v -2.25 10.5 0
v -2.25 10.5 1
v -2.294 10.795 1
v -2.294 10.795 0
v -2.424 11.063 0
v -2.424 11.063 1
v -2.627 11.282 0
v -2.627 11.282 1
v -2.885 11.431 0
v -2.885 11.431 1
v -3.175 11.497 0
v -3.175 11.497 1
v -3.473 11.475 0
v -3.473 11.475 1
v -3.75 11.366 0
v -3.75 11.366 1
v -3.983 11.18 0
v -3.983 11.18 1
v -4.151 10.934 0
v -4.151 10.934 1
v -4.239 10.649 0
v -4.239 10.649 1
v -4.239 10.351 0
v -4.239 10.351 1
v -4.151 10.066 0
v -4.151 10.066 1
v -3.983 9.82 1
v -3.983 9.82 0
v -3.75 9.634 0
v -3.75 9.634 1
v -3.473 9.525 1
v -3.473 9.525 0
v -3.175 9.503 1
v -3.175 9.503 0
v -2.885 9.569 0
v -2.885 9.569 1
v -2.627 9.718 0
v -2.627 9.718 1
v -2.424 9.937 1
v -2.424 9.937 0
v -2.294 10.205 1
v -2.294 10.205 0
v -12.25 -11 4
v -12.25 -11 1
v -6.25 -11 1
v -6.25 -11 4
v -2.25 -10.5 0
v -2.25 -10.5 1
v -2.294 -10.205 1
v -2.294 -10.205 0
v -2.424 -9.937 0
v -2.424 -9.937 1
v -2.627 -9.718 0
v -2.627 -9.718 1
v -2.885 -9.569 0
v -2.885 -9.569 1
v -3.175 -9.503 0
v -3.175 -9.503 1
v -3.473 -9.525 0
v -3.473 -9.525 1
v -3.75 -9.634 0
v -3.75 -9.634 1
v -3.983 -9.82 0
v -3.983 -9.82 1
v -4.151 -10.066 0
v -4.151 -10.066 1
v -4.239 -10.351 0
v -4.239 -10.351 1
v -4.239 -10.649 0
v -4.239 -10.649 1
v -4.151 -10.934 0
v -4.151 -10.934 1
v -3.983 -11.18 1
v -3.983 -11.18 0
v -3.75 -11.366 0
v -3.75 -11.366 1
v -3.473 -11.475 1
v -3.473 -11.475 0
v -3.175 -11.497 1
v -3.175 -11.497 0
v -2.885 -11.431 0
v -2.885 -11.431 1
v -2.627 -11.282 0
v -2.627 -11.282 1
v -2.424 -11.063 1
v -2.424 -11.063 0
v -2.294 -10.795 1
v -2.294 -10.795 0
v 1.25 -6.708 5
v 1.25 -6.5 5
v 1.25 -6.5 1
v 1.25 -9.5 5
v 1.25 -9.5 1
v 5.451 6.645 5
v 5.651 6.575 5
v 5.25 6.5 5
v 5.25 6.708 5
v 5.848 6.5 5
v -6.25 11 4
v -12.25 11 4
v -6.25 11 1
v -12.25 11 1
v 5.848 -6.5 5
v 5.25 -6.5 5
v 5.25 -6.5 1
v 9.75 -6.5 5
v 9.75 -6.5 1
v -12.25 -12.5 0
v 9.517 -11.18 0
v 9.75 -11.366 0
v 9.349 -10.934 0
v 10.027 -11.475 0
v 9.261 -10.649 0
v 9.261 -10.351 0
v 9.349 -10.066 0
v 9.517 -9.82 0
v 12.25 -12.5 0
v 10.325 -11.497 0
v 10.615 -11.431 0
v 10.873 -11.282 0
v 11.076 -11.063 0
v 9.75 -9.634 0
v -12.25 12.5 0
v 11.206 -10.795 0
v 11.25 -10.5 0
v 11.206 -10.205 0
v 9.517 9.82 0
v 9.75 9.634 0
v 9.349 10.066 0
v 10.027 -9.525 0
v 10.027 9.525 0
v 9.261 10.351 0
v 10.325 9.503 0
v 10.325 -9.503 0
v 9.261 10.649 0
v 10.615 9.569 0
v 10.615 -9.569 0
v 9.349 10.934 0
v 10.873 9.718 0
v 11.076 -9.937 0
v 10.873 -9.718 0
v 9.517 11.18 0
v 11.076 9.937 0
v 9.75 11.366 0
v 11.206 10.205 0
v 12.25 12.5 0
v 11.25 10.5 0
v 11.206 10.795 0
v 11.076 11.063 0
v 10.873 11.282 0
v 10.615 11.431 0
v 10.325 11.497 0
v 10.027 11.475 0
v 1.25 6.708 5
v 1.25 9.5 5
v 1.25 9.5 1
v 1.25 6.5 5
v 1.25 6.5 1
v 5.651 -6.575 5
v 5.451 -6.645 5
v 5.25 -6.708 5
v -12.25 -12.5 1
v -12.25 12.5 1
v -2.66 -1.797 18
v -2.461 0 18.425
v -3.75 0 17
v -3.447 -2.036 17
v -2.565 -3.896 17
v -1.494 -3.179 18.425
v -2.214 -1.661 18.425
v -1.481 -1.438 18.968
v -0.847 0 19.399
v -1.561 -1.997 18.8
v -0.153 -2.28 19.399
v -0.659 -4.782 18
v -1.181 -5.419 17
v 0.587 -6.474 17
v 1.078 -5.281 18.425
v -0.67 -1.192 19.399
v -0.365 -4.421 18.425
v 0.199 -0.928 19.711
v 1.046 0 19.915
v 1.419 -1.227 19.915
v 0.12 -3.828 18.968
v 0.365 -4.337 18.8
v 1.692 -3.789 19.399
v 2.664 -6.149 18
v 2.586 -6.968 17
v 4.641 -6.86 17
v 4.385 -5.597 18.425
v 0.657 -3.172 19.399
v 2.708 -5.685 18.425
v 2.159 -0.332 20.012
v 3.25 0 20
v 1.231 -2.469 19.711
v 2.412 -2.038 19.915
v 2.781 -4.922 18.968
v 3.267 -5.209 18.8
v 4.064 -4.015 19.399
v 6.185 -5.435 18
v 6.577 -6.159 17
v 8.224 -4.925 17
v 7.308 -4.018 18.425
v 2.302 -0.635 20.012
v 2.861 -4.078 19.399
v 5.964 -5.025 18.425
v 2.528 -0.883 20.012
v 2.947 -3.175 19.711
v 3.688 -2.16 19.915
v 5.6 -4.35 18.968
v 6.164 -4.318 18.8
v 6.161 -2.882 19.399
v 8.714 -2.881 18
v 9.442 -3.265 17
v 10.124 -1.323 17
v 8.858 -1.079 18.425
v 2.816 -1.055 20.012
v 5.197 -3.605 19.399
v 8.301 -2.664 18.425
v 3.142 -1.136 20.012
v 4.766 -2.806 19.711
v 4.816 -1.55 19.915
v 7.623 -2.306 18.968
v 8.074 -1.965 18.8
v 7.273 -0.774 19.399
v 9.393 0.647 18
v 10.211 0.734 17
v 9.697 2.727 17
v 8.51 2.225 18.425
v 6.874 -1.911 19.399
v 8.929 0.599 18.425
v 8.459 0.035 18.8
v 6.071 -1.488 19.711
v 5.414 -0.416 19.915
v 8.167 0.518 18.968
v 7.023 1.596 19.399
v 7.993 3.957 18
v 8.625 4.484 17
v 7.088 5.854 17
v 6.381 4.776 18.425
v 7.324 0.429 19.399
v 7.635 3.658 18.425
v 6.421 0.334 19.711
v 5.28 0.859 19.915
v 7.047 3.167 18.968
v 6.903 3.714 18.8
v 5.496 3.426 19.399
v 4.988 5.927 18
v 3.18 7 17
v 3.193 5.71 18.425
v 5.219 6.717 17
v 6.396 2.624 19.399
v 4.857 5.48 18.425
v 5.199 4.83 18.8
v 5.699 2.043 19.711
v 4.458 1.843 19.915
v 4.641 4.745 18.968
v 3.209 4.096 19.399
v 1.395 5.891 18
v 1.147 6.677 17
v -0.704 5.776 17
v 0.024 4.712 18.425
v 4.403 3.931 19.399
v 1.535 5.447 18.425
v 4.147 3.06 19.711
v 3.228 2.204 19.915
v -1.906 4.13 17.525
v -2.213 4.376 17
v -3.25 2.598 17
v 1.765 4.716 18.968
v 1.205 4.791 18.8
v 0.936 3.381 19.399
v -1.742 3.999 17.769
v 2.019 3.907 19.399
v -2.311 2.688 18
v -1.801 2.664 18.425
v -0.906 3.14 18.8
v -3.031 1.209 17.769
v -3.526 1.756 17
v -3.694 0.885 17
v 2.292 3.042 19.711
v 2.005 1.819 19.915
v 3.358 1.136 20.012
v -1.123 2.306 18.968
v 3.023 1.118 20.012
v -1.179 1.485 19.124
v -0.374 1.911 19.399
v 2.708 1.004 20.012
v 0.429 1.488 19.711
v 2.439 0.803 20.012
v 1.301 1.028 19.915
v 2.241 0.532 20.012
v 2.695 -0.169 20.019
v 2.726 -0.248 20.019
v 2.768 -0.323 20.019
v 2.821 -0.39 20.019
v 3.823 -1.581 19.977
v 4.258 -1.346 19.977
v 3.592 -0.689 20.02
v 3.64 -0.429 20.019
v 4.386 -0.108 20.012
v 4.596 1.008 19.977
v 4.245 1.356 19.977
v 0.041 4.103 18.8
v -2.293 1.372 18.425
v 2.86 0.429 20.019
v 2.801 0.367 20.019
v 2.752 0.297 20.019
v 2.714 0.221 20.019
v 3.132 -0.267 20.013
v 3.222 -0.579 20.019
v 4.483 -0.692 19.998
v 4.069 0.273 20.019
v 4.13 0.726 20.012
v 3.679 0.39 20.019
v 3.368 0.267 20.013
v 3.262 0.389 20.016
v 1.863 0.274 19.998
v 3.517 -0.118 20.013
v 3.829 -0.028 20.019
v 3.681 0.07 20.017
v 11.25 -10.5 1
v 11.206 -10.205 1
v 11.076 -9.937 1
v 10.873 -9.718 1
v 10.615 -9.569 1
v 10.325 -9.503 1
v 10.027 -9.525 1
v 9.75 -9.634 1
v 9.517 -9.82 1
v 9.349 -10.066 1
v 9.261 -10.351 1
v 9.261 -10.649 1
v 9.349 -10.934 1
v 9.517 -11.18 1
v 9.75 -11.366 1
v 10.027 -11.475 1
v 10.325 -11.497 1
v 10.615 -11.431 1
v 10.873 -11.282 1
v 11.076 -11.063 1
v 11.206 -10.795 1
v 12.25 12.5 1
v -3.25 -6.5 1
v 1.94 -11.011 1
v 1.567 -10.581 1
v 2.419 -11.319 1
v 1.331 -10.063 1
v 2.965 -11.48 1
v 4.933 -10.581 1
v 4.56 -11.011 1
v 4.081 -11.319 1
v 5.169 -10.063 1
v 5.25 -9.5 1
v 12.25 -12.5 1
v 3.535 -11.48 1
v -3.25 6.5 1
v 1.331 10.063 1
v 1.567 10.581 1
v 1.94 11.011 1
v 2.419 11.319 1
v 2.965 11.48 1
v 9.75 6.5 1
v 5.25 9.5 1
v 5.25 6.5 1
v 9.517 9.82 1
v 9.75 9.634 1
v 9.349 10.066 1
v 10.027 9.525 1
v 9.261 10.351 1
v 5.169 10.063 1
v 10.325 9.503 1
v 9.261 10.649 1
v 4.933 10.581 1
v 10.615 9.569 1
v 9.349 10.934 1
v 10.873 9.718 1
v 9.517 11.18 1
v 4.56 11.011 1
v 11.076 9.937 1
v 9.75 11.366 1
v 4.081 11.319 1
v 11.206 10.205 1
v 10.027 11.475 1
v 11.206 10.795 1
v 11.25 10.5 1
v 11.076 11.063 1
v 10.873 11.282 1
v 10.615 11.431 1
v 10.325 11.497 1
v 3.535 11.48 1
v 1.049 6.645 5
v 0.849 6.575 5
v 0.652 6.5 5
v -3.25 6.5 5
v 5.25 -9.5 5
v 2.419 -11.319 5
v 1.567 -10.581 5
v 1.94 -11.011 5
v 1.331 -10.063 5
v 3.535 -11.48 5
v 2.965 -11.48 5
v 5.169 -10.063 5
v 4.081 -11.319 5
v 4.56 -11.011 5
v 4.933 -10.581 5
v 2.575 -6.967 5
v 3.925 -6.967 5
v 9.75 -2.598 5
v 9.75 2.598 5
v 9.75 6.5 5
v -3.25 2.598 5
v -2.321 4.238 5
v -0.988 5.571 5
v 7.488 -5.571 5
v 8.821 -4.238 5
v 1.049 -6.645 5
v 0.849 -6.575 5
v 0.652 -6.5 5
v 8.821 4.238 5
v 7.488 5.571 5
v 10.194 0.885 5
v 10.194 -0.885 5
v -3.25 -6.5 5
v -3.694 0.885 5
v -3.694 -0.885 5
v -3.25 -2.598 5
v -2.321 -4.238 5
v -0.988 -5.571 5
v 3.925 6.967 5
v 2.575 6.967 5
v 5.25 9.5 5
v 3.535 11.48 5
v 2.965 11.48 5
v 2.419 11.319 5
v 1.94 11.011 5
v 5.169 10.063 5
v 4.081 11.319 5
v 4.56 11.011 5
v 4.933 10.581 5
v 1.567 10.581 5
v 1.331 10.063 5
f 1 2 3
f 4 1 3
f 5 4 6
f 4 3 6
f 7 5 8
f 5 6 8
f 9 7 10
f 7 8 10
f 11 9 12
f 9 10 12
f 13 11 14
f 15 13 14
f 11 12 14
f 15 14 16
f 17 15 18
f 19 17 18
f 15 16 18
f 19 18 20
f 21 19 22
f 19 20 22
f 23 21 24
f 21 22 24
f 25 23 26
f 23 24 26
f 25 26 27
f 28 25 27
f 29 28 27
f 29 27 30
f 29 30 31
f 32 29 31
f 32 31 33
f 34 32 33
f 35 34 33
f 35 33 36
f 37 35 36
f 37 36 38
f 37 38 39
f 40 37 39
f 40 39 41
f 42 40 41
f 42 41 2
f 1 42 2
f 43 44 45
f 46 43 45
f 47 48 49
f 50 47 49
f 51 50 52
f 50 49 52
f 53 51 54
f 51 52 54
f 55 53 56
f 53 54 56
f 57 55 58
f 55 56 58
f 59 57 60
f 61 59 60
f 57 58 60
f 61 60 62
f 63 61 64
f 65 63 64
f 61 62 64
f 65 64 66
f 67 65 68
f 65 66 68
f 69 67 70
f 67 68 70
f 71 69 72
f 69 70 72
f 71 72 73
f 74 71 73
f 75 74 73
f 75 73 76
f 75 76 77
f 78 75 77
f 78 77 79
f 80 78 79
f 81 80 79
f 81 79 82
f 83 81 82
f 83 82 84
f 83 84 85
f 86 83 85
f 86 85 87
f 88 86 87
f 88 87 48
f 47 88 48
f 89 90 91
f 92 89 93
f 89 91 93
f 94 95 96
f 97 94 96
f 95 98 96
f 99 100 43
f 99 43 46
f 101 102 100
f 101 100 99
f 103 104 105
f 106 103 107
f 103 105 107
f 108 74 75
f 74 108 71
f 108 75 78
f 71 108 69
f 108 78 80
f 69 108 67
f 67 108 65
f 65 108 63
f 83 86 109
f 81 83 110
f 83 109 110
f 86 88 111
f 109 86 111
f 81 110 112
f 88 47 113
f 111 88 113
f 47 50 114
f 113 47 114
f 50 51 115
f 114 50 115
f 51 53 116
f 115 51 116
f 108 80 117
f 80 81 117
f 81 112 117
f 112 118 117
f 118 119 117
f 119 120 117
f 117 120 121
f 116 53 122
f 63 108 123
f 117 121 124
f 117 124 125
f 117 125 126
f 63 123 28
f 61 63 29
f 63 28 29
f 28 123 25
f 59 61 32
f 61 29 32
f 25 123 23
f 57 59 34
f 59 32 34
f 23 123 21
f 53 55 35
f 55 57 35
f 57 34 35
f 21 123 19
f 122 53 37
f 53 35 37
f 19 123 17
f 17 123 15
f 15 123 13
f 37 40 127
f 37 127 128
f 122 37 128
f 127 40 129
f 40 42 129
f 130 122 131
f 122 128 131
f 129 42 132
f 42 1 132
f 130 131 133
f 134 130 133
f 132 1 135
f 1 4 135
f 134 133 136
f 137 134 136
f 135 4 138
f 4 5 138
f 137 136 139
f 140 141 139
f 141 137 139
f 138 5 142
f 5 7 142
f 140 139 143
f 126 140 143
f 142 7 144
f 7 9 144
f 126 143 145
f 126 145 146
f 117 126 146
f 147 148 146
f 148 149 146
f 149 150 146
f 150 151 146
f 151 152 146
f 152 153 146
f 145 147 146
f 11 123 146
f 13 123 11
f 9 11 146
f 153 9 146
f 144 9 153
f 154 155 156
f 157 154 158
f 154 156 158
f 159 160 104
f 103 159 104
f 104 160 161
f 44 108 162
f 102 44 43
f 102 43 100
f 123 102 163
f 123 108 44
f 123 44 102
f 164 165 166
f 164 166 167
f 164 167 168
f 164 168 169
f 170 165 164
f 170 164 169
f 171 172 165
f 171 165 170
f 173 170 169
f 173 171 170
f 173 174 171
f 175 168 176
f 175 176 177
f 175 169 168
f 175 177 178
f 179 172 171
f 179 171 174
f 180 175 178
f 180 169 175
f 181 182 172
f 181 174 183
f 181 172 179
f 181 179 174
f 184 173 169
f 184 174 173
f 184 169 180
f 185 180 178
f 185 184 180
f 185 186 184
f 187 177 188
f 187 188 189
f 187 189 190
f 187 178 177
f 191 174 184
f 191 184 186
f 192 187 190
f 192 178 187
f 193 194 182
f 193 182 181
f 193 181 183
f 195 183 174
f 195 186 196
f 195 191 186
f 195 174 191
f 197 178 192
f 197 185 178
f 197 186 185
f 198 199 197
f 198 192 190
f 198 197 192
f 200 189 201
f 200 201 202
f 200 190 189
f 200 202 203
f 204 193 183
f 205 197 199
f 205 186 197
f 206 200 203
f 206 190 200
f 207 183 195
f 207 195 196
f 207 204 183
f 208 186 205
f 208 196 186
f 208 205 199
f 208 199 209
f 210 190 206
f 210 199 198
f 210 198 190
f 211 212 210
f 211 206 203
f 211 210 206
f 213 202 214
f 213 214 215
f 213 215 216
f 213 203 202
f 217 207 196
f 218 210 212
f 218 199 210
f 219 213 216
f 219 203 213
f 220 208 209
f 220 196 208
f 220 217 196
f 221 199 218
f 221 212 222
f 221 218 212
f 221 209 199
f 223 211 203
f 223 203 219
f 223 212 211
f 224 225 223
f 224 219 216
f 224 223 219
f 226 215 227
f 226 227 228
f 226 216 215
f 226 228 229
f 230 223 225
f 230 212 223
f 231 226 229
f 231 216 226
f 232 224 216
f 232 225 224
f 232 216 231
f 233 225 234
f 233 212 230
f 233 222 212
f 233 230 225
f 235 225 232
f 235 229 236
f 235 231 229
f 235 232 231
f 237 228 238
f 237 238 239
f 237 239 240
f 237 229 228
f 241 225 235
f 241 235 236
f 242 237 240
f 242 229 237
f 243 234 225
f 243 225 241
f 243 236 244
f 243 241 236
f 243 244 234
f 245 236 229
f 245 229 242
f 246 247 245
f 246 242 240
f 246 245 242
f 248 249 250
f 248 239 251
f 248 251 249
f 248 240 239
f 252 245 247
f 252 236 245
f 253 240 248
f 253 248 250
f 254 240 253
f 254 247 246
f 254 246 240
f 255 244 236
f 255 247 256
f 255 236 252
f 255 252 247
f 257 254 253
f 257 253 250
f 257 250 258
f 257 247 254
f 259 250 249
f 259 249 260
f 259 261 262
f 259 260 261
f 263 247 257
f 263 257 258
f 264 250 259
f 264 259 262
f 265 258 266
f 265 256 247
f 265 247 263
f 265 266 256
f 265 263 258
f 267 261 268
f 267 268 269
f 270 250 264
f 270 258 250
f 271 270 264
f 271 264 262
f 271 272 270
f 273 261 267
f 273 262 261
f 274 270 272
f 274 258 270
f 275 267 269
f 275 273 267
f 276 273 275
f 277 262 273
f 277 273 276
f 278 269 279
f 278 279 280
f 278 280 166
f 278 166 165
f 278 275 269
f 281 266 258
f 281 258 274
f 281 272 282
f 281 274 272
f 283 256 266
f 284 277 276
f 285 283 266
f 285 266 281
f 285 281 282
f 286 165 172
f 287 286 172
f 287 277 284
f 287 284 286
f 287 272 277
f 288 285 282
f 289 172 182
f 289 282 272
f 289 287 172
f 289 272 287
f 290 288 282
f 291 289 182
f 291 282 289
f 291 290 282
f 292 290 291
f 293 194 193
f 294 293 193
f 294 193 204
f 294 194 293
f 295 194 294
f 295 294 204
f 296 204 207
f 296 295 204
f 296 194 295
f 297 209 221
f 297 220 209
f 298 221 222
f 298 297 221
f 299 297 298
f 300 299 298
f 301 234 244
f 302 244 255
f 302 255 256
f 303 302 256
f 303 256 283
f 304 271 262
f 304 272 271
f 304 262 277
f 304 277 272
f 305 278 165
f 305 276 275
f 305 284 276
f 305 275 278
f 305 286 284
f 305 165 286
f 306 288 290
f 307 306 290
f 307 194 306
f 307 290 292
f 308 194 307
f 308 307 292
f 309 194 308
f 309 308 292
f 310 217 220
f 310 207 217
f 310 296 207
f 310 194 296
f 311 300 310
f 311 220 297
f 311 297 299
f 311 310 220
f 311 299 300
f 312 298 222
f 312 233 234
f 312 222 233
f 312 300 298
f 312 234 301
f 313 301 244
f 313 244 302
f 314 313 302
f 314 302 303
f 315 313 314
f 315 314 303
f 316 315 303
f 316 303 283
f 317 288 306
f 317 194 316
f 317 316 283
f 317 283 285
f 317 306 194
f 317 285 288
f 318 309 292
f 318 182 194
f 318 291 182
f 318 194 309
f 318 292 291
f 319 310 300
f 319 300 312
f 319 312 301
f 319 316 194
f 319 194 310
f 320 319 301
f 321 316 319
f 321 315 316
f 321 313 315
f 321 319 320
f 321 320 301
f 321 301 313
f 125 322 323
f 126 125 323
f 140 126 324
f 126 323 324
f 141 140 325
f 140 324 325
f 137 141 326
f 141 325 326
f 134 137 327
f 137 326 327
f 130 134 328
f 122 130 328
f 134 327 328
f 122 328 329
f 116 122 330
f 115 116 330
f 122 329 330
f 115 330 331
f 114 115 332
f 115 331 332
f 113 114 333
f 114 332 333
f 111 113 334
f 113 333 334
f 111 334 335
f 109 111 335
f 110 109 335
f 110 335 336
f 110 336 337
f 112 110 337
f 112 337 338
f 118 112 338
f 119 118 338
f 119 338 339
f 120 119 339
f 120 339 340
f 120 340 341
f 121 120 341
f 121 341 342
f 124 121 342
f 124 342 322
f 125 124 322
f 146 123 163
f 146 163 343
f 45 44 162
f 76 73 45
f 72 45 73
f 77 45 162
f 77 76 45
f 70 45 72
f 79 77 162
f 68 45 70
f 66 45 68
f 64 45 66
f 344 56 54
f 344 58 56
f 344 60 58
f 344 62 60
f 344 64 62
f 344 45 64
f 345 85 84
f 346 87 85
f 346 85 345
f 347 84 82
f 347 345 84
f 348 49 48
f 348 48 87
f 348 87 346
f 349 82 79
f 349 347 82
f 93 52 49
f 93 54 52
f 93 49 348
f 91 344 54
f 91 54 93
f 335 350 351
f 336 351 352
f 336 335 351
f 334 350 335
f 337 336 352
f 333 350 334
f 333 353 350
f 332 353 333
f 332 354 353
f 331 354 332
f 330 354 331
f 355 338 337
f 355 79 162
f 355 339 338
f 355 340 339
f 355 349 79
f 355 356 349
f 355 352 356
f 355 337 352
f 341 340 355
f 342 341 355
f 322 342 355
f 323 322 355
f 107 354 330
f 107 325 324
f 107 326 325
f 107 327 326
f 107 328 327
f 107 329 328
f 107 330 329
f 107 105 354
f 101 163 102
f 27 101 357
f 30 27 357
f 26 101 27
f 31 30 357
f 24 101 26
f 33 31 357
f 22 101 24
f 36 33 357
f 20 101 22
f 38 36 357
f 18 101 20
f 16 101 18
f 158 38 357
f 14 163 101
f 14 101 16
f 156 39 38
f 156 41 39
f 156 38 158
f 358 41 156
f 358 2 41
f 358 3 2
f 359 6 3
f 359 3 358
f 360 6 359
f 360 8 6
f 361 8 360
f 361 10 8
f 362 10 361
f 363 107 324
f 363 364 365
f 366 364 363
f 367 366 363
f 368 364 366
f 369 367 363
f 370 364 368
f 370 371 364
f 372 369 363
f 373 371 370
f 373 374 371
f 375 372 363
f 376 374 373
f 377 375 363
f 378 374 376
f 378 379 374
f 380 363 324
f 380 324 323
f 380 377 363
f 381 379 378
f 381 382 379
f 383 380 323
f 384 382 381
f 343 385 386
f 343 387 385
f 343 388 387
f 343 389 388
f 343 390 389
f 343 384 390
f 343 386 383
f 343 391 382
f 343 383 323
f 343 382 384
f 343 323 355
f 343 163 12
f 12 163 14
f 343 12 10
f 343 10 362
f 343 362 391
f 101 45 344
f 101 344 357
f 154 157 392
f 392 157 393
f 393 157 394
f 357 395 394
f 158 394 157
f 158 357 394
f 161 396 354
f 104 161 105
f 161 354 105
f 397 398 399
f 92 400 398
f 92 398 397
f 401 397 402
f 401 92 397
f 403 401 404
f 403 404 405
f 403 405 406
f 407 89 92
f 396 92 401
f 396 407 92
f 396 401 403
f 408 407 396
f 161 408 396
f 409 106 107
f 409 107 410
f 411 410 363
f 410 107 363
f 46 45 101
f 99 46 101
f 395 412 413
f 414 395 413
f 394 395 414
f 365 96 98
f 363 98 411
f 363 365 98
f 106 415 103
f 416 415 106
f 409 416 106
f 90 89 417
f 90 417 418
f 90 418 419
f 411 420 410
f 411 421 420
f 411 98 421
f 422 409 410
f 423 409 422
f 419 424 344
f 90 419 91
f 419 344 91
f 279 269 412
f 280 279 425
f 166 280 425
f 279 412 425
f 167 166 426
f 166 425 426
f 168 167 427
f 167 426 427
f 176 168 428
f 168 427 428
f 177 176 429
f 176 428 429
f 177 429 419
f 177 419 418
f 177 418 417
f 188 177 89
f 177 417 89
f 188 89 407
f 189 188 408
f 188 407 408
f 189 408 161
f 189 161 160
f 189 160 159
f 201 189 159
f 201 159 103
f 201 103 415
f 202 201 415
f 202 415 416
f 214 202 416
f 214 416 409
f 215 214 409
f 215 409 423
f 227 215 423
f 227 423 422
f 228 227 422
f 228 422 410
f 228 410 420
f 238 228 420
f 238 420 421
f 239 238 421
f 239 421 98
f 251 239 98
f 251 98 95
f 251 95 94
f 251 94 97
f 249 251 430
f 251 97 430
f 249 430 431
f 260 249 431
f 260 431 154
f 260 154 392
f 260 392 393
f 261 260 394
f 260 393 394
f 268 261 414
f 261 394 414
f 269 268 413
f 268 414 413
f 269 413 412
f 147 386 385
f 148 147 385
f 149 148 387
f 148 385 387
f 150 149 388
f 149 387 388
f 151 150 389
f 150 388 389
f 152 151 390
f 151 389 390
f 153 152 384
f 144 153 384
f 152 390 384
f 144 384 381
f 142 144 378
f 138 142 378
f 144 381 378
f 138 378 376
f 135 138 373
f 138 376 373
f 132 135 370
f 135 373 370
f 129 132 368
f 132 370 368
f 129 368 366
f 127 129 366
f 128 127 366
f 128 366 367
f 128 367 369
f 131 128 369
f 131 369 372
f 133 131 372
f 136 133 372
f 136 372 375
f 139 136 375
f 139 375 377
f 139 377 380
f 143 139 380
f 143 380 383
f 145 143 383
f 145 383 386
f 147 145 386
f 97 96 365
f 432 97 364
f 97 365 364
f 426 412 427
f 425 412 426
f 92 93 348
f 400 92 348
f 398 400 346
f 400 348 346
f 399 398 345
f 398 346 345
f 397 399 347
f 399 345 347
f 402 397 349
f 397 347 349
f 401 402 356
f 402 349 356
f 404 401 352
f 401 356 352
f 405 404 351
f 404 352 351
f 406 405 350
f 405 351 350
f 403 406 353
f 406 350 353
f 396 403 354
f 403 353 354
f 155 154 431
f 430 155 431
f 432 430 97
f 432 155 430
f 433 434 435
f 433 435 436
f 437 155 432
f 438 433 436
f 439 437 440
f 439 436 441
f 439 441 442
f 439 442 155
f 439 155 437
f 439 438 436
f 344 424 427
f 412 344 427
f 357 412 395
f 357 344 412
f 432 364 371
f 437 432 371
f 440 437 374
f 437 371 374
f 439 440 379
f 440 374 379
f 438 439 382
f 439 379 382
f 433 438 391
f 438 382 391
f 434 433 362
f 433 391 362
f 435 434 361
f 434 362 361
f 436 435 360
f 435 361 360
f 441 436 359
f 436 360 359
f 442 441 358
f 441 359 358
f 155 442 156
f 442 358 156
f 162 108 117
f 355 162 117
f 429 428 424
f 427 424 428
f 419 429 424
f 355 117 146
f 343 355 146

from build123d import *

# Parameters (mm, degrees)
SKETCH1_W           = 24.5
SKETCH1_H           = 25
BOSS_EXTRUDE1_DEPTH = 1
SKETCH2_W           = 6
SKETCH2_H           = 22
BOSS_EXTRUDE2_DEPTH = 3
SKETCH3_R           = 1
CUT_EXTRUDE1_DEPTH  = 18.757040857
SKETCH4_R           = 2
SKETCH4_W           = 13
SKETCH4_H           = 13
BOSS_EXTRUDE3_DEPTH = 4
SKETCH5_R           = 7
BOSS_EXTRUDE4_DEPTH = 12


with BuildPart() as part:
    # Sketch1 → Boss-Extrude1 (new body)
    with BuildSketch(Plane.XY):
        Rectangle(SKETCH1_W, SKETCH1_H)
    extrude(amount=BOSS_EXTRUDE1_DEPTH)

    # Sketch2 → Boss-Extrude2 (add)
    with BuildSketch(Plane.XY.offset(1)):
        with Locations((-9.25, 0)):
            Rectangle(SKETCH2_W, SKETCH2_H)
    extrude(amount=BOSS_EXTRUDE2_DEPTH)

    # Sketch3 → Cut-Extrude1 (cut, through all)
    with BuildSketch(Plane.XY.offset(1)):
        with Locations((10.25, 10.5)):
            Circle(SKETCH3_R)
        with Locations((10.25, -10.5)):
            Circle(SKETCH3_R)
        with Locations((-3.25, 10.5)):
            Circle(SKETCH3_R)
        with Locations((-3.25, -10.5)):
            Circle(SKETCH3_R)
    extrude(amount=-CUT_EXTRUDE1_DEPTH, mode=Mode.SUBTRACT)

    # Sketch4 → Boss-Extrude3 (add)
    with BuildSketch(Plane.XY.offset(1)):
        with Locations((3.25, 9.5)):
            Circle(SKETCH4_R)
        with BuildLine():
            Line((5.25, 6.5), (5.25, 9.5))
            ThreePointArc((5.25, 9.5), (3.25, 7.5), (1.25, 9.5))
            Line((1.25, 9.5), (1.25, 6.5))
            Line((1.25, 6.5), (5.25, 6.5))
        make_face()
        with Locations((3.25, 0)):
            Rectangle(SKETCH4_W, SKETCH4_H)
        with Locations((3.25, -9.5)):
            Circle(SKETCH4_R)
        with BuildLine():
            Line((5.25, -9.5), (5.25, -6.5))
            Line((5.25, -6.5), (1.25, -6.5))
            Line((1.25, -6.5), (1.25, -9.5))
            ThreePointArc((1.25, -9.5), (3.25, -7.5), (5.25, -9.5))
        make_face()
    extrude(amount=BOSS_EXTRUDE3_DEPTH)

    # Sketch5 → Boss-Extrude4 (add)
    with BuildSketch(Plane.XY.offset(5)):
        with Locations(Location((3.25, 0, 0), (0, 0, 158.213210702))):
            Circle(SKETCH5_R)
    extrude(amount=BOSS_EXTRUDE4_DEPTH)

    # Sketch7 → Revolve1 (revolve)
    with BuildSketch(Plane(origin=(0, 0, 0), x_dir=(1, 0, 0), z_dir=(0, 1, 0))):
        with BuildLine():
            Line((3.25, -17), (3.25, -20))
            add(Edge.make_bspline(
                [(-3.75, -17), (-1.521062197, -20.264896089), (3.25, -20)],
                knots=[0, 0, 0, 1, 1, 1], degree=2))
            Line((-3.75, -17), (3.25, -17))
        make_face()
    revolve(axis=Axis((3.25, 0, 17), (0, 0, 1)))


solid = part.part
